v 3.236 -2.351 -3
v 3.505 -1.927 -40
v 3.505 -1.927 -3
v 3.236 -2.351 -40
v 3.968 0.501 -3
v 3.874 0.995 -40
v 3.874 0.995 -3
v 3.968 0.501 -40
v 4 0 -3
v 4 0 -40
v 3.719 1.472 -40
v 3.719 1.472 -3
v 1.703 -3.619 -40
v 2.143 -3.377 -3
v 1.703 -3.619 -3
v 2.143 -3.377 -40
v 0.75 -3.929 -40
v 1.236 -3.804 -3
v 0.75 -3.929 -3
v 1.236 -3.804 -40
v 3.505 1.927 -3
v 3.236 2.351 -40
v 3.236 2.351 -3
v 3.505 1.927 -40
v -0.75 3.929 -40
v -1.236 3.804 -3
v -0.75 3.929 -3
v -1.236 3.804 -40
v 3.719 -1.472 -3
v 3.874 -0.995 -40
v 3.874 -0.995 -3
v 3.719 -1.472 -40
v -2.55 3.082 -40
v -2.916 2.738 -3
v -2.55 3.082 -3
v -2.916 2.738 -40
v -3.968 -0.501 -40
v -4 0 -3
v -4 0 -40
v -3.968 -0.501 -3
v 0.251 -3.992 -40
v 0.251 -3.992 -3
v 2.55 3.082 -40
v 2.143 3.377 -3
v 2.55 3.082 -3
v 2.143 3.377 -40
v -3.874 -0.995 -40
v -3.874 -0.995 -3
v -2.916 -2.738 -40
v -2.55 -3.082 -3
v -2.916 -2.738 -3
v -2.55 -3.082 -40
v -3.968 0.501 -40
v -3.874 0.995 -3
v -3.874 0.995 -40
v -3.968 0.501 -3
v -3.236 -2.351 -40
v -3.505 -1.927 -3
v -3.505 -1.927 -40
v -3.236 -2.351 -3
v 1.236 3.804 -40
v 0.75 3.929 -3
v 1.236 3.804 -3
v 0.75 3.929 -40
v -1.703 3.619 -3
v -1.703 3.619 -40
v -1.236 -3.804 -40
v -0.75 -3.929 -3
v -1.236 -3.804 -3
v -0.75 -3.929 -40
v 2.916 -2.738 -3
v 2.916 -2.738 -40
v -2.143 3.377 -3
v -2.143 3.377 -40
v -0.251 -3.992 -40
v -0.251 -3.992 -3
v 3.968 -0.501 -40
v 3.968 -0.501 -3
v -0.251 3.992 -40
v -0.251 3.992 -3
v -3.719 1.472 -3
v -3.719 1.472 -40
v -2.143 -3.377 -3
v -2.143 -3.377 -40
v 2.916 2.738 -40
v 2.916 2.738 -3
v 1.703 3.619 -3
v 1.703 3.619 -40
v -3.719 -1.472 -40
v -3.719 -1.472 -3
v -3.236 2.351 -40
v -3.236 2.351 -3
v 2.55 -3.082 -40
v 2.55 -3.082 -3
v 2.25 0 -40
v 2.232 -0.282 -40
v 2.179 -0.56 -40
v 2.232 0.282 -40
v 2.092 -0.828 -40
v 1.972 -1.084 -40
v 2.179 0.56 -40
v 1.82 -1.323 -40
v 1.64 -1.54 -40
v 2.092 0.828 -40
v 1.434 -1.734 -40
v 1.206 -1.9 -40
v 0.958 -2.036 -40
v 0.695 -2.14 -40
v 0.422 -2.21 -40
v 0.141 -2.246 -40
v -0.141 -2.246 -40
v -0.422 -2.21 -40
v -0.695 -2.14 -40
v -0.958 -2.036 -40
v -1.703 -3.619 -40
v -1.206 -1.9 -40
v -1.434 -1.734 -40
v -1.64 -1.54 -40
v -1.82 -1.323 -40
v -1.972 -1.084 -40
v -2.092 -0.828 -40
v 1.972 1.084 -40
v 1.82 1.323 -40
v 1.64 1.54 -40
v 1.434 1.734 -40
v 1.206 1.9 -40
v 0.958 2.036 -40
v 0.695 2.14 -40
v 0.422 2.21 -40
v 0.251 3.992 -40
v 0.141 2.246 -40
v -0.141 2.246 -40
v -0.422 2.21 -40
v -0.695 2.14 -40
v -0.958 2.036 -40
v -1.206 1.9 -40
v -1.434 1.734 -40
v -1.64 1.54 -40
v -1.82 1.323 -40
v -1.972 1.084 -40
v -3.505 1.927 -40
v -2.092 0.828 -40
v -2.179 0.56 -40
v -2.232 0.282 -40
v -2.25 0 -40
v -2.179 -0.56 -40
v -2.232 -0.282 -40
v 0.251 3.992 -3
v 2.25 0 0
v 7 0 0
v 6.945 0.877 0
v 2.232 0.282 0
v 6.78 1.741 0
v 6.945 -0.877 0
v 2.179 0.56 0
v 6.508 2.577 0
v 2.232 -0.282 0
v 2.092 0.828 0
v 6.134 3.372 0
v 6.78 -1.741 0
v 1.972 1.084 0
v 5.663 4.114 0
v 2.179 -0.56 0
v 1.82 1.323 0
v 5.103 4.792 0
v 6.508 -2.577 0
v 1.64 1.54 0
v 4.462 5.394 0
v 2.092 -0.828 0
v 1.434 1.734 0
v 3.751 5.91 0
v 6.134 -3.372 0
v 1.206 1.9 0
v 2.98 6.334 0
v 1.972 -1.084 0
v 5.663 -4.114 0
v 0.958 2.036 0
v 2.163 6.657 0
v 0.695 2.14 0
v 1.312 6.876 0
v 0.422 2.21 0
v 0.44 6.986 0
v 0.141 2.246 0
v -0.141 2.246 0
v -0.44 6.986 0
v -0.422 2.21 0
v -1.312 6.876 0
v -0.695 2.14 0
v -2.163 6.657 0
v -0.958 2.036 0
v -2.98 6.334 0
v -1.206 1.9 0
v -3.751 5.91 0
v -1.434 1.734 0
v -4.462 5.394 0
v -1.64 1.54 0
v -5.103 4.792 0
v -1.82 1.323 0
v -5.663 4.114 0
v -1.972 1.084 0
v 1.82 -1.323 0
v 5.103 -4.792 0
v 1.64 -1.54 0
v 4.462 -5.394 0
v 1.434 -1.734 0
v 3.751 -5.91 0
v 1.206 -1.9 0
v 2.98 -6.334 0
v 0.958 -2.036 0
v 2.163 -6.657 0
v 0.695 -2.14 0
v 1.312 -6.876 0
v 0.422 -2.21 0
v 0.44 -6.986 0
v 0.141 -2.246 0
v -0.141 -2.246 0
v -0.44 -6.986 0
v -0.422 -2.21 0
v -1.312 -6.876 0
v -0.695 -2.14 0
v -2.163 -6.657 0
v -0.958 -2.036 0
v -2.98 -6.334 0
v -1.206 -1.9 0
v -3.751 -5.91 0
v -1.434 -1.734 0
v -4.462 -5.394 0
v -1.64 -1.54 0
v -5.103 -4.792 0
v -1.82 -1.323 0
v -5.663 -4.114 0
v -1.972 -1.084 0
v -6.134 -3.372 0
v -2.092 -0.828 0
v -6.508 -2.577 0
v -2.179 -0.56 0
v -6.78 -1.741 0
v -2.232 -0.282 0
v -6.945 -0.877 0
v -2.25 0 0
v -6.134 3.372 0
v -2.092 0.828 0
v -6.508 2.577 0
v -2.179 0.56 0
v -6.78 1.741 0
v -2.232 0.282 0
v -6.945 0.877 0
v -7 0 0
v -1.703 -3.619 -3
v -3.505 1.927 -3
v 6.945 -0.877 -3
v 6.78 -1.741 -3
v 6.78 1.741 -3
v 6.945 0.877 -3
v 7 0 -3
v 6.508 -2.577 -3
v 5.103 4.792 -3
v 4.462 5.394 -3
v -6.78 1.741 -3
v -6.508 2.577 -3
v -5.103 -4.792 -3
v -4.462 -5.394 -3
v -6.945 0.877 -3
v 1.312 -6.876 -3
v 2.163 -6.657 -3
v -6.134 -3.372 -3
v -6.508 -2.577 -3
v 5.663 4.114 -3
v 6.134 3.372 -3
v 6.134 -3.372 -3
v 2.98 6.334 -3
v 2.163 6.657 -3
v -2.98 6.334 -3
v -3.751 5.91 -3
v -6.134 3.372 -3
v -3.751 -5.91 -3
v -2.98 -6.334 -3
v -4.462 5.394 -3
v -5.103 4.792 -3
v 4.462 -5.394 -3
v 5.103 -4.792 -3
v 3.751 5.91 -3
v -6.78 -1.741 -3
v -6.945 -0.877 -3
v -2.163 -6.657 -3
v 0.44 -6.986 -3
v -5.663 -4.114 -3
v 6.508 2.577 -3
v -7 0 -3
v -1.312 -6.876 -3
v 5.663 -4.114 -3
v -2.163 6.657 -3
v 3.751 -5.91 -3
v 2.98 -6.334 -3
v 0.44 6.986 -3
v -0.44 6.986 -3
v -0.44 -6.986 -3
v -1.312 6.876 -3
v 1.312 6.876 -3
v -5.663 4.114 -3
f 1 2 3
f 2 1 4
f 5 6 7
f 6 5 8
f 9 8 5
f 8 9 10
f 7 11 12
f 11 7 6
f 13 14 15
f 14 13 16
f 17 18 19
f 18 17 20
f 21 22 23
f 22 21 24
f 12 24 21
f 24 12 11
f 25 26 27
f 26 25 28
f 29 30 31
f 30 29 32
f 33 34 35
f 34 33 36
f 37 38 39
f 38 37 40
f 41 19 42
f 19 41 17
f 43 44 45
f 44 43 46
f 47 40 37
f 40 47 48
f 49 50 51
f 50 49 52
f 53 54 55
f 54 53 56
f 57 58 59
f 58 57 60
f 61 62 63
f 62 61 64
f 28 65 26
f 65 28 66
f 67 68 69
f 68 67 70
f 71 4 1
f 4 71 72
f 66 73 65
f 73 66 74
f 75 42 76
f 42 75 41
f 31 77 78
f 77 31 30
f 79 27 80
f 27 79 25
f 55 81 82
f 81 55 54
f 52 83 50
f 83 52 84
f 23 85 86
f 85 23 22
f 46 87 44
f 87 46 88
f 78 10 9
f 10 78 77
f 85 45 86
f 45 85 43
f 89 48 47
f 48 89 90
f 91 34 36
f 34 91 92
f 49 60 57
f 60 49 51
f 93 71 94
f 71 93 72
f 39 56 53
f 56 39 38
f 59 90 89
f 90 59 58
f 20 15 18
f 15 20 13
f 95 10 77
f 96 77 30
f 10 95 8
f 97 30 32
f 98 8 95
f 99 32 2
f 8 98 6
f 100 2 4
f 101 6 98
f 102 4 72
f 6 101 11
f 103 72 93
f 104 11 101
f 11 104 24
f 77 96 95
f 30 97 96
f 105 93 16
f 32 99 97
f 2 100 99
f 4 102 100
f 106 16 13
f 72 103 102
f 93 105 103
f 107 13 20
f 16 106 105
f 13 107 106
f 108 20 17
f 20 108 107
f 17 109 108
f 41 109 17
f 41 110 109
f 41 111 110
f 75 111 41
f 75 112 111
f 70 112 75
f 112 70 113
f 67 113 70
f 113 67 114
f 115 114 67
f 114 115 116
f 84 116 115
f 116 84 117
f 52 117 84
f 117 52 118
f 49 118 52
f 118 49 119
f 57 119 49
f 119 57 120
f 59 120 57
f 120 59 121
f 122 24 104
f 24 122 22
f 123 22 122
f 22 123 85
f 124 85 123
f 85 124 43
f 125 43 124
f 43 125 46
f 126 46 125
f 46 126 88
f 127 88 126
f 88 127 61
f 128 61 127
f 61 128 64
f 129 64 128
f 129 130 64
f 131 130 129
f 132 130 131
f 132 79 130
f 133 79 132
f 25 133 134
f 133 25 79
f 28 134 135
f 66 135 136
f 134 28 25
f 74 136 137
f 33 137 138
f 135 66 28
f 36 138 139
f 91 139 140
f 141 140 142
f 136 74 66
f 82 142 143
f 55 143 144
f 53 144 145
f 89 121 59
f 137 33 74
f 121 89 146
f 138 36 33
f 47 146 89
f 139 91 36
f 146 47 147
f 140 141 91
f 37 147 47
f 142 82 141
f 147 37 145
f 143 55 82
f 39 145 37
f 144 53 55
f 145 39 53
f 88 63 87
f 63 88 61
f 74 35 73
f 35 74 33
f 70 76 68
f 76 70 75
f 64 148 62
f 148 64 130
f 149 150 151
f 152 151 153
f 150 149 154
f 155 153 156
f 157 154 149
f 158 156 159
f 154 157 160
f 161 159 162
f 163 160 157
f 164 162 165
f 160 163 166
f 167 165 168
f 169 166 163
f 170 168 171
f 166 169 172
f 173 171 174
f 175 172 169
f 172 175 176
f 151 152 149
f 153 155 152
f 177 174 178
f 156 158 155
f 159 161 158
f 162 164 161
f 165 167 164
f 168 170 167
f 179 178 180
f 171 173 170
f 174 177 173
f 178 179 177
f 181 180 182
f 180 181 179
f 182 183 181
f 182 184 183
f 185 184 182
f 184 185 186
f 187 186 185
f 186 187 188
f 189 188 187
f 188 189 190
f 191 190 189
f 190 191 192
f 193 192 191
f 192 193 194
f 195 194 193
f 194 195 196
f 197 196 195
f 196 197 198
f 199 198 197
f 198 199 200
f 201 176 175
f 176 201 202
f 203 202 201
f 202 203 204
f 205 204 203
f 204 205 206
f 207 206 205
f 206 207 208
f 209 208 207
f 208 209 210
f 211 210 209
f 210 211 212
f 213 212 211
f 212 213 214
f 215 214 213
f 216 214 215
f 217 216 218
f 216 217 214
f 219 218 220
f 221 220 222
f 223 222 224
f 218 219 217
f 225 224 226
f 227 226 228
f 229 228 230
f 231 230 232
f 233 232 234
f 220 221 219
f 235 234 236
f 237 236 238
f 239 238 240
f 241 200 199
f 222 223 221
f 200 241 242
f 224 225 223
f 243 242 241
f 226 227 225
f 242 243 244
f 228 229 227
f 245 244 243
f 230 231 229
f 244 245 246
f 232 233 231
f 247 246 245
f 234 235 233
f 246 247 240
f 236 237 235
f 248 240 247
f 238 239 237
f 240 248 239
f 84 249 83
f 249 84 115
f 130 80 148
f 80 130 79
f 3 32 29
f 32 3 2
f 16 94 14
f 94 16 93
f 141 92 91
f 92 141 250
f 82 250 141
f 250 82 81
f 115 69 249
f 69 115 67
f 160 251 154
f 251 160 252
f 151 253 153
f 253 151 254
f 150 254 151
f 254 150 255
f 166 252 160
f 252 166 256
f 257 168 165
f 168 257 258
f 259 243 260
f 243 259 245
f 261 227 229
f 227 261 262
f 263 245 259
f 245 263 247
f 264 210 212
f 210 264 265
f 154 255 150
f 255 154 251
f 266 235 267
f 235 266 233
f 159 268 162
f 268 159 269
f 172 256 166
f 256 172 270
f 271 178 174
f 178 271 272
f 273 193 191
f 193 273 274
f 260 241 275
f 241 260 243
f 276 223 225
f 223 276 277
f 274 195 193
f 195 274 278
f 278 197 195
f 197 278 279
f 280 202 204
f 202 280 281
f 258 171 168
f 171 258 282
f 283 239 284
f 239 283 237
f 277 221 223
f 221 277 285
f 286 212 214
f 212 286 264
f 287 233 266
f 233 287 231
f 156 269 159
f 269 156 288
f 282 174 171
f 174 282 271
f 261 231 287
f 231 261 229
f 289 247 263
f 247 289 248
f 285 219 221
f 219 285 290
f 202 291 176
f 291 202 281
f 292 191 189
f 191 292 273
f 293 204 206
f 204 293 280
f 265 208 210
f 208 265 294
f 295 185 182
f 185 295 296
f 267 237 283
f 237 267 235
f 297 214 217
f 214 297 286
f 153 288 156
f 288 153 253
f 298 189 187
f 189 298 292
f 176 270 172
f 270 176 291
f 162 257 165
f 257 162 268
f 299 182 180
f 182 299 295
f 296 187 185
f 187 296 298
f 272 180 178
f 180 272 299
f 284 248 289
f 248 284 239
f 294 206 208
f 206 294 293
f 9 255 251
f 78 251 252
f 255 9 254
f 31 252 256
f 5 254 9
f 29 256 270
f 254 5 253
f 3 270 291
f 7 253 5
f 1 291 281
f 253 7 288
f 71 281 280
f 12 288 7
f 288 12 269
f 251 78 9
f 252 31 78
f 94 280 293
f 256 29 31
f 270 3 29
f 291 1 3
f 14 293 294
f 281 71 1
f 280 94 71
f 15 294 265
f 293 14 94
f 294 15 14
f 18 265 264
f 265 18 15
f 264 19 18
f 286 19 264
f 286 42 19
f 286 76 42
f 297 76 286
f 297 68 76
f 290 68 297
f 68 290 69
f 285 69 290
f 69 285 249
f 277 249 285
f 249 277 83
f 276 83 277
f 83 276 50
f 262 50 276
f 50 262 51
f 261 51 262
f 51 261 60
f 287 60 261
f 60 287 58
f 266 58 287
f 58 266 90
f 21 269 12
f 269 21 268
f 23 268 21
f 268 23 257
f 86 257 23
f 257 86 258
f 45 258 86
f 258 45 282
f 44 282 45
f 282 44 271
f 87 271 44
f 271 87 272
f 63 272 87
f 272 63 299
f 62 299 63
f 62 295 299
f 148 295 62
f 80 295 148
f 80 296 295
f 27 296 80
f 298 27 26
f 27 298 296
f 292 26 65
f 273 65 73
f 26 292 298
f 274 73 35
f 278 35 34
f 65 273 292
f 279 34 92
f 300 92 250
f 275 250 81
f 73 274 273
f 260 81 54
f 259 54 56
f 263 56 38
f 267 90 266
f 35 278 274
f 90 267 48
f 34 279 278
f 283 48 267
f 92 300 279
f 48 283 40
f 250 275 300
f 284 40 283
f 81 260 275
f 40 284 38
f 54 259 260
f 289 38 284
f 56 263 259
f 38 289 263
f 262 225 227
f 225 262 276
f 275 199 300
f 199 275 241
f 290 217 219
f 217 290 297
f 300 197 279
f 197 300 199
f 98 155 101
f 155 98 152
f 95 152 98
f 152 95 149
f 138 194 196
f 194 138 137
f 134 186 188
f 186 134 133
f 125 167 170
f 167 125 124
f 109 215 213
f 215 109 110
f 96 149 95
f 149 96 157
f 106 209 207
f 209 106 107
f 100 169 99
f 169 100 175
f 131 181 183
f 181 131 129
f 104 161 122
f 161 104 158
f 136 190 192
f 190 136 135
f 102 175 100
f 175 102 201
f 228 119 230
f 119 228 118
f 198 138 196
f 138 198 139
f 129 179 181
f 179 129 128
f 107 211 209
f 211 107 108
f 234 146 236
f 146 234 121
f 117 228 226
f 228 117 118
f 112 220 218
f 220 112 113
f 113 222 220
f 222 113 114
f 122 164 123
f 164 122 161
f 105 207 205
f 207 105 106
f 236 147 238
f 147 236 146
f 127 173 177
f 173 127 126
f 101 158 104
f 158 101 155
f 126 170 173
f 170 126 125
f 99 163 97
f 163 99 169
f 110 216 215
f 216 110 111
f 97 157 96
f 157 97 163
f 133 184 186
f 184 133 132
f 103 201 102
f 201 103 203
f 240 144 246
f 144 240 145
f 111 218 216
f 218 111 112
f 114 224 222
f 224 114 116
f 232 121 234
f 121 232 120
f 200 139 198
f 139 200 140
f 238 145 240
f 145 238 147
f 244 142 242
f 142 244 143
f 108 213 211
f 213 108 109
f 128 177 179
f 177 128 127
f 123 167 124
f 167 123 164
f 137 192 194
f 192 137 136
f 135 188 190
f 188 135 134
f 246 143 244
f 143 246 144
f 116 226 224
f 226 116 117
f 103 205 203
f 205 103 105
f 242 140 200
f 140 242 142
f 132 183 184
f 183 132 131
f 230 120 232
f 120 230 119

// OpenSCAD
$fn = 50;


difference() {
	union() {
		translate(v = [0, 0, -40.0000000000]) {
			cylinder(h = 40, r = 4.0000000000);
		}
		translate(v = [0, 0, -3.0000000000]) {
			cylinder(h = 3, r = 7.0000000000);
		}
	}
	union() {
		#translate(v = [0, 0, -40]) {
			cylinder(h = 40, r = 2.2500000000);
		}
	}
}
